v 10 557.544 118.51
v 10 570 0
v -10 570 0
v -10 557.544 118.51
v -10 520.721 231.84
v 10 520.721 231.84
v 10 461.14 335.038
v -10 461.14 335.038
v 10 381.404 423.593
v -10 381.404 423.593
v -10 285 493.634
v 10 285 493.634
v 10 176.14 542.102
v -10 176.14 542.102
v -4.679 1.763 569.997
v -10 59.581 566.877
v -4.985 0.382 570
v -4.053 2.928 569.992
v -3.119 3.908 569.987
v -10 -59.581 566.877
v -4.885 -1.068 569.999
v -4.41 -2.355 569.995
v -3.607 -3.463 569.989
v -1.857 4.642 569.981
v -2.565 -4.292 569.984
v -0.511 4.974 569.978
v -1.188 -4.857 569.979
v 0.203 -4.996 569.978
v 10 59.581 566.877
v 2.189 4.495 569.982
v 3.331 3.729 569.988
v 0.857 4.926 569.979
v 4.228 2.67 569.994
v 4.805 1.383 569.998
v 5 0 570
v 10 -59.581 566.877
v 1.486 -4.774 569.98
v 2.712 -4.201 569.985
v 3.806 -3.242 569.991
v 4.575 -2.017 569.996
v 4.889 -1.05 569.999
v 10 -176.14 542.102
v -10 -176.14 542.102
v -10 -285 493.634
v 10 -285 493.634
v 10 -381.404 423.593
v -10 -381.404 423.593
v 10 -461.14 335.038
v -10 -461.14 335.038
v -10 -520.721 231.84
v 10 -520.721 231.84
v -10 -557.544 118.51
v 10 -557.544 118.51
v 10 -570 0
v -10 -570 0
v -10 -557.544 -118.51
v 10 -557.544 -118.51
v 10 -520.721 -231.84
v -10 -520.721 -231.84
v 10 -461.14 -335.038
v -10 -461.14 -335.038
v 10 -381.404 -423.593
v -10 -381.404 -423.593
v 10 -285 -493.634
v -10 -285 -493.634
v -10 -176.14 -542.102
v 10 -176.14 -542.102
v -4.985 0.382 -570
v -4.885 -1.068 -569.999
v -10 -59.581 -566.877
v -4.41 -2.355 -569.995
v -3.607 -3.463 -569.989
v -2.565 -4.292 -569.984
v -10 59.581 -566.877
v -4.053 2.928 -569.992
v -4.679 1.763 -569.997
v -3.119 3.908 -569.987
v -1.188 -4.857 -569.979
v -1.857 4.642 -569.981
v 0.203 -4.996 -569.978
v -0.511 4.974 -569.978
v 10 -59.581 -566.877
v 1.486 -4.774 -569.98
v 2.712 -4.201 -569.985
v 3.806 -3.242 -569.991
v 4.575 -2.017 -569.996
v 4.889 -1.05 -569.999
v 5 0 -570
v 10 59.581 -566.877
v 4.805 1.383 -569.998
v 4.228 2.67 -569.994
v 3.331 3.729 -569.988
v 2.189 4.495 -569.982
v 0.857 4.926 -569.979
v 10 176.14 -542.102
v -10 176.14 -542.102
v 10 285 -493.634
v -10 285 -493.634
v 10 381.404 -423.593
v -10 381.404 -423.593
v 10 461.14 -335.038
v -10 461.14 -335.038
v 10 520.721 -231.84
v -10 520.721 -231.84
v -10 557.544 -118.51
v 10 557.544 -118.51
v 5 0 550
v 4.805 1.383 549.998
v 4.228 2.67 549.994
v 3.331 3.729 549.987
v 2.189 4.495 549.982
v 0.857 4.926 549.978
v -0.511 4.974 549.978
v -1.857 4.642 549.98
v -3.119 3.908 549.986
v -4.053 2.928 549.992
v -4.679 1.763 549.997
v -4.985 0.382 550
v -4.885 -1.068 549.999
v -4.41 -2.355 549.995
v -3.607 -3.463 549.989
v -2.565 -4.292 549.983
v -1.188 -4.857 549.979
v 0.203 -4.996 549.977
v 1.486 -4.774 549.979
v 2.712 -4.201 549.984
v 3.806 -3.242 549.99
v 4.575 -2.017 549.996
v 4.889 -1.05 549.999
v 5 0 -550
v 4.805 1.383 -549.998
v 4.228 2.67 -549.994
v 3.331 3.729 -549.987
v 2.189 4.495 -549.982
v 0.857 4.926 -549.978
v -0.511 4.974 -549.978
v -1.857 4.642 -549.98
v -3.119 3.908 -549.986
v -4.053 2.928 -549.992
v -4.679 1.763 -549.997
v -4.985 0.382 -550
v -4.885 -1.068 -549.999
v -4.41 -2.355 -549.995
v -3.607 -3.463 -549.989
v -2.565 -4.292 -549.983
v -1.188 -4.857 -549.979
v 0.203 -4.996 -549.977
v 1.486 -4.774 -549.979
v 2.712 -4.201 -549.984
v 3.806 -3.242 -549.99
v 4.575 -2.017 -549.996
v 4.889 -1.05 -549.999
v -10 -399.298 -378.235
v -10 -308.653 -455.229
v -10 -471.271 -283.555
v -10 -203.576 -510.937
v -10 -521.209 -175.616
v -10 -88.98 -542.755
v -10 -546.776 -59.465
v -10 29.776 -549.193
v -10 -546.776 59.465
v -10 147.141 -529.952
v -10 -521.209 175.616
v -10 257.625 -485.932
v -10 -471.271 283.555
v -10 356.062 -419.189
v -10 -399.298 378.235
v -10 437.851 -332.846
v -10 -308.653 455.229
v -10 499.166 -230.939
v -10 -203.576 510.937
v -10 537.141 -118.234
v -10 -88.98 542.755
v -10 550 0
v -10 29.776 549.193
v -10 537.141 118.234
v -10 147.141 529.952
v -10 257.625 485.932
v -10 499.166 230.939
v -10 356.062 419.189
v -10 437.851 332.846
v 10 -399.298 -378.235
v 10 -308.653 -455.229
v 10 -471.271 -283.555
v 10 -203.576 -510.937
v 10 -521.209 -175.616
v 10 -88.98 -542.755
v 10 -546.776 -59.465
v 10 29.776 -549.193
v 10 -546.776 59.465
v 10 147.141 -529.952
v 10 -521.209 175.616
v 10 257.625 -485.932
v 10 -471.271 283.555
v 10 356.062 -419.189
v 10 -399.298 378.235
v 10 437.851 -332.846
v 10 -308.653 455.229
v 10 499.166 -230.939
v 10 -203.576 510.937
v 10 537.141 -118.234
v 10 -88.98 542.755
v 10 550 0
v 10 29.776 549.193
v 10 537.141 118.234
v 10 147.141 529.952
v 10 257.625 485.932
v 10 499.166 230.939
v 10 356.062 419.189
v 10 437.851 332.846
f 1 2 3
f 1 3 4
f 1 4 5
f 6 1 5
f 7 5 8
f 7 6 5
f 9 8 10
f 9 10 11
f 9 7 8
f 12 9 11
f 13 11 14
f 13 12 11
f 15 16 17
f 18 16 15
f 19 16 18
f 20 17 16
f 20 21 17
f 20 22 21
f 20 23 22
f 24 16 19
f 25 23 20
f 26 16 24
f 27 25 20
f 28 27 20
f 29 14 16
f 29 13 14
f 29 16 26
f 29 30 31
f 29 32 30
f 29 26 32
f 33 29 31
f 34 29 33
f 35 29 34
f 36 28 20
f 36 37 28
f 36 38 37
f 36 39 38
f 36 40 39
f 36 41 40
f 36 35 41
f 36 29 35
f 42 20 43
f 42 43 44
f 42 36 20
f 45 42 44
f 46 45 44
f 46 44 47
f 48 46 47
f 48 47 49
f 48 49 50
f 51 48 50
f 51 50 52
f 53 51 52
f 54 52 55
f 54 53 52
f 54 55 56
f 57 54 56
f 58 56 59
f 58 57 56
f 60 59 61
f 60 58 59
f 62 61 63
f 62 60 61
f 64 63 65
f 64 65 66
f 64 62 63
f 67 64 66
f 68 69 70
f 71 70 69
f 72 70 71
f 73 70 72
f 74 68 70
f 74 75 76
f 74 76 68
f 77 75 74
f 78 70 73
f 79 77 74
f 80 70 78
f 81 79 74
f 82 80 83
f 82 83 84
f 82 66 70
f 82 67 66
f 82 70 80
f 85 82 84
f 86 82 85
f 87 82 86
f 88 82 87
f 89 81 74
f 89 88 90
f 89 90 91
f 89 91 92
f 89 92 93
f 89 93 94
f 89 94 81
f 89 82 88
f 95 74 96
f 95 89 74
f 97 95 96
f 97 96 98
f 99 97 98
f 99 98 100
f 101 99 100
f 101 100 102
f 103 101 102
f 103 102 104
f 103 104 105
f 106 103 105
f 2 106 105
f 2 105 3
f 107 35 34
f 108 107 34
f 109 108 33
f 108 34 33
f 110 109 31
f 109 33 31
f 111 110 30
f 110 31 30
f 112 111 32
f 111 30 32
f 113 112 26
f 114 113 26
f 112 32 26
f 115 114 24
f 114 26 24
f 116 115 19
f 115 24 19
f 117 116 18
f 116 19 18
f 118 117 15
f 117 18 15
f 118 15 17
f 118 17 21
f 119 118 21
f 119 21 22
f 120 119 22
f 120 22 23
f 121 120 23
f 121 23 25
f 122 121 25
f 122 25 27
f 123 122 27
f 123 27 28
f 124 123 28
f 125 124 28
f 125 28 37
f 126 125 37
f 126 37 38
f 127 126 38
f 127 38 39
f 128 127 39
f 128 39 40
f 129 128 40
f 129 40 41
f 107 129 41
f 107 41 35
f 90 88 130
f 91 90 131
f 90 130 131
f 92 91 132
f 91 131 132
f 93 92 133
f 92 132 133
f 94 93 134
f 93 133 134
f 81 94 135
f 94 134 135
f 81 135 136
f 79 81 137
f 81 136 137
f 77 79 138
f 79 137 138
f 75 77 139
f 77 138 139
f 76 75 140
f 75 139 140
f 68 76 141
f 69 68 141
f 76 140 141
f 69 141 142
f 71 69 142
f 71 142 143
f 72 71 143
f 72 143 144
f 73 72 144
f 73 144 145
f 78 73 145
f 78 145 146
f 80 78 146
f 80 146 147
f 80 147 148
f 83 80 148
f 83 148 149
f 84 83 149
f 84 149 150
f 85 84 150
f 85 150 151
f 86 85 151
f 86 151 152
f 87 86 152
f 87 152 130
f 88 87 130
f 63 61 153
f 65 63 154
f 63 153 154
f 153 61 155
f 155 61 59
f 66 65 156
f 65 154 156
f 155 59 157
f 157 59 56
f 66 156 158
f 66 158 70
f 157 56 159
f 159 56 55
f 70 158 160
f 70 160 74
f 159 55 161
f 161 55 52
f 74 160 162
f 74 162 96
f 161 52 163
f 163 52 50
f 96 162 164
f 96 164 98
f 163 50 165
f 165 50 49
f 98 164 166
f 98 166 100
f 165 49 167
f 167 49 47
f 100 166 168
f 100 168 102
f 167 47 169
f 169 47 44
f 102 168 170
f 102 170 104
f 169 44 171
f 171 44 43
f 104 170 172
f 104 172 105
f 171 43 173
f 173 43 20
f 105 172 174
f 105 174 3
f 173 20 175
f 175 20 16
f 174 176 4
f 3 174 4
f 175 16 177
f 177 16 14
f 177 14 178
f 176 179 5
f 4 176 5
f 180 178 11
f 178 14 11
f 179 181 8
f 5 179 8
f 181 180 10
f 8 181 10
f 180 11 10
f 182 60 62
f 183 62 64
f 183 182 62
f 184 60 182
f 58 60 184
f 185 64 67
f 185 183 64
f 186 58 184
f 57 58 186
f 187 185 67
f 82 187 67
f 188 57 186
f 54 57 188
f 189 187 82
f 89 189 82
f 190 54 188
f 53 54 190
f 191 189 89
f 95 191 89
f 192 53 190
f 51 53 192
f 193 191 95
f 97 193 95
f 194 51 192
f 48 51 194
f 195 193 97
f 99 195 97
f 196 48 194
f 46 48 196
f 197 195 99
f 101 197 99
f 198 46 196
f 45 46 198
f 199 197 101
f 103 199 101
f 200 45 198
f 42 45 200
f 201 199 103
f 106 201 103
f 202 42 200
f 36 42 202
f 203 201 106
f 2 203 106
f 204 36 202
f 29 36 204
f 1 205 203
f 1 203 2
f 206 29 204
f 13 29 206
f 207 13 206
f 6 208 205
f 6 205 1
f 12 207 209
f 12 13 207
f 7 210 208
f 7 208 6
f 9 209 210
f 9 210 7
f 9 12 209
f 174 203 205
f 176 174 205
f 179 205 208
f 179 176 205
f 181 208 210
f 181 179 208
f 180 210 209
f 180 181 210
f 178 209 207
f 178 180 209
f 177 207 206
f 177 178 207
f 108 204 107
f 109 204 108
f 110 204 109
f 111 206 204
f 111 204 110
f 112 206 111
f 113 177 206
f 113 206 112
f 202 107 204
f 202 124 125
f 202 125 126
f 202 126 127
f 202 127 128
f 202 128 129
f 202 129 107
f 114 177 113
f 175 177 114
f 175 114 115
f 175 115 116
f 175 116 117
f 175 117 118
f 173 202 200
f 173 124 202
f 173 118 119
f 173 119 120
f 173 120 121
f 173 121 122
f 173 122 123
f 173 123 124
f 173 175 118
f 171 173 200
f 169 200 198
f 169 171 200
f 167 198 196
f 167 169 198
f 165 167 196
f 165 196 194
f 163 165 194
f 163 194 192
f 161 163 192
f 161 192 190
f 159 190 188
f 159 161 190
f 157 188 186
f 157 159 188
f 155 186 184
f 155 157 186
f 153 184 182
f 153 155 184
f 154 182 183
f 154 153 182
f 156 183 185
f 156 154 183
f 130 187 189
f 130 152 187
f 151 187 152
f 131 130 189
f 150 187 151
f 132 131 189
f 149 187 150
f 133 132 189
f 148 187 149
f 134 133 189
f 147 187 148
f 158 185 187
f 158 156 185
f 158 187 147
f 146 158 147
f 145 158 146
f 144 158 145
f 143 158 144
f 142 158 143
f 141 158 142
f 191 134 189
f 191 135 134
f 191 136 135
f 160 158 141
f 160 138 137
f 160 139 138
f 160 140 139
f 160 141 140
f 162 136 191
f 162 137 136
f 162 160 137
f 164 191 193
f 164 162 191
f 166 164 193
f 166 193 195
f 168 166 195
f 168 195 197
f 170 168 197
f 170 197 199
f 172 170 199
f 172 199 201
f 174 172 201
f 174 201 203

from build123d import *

# Parameters (mm, degrees)
SKETCH012_R      = 5
EXTRUDE012_DEPTH = 1500
SKETCH001_R      = 570
SKETCH001_R_2    = 550
EXTRUDE_DEPTH    = 10


with BuildPart() as extrude012:
    # Sketch012 (on Face1 of Extrude011) → Extrude012 (new body)
    with BuildSketch(Plane.XY.offset(650)):
        Circle(SKETCH012_R)
    extrude(amount=-EXTRUDE012_DEPTH)


with BuildPart() as cut:
    # Sketch001 → Extrude (new body, symmetric)
    with BuildSketch(Plane.YZ):
        Circle(SKETCH001_R)
        Circle(SKETCH001_R_2, mode=Mode.SUBTRACT)
    extrude(amount=EXTRUDE_DEPTH, both=True)

    # Cut: cut Extrude012
    add(extrude012.part, mode=Mode.SUBTRACT)


solid = cut.part
